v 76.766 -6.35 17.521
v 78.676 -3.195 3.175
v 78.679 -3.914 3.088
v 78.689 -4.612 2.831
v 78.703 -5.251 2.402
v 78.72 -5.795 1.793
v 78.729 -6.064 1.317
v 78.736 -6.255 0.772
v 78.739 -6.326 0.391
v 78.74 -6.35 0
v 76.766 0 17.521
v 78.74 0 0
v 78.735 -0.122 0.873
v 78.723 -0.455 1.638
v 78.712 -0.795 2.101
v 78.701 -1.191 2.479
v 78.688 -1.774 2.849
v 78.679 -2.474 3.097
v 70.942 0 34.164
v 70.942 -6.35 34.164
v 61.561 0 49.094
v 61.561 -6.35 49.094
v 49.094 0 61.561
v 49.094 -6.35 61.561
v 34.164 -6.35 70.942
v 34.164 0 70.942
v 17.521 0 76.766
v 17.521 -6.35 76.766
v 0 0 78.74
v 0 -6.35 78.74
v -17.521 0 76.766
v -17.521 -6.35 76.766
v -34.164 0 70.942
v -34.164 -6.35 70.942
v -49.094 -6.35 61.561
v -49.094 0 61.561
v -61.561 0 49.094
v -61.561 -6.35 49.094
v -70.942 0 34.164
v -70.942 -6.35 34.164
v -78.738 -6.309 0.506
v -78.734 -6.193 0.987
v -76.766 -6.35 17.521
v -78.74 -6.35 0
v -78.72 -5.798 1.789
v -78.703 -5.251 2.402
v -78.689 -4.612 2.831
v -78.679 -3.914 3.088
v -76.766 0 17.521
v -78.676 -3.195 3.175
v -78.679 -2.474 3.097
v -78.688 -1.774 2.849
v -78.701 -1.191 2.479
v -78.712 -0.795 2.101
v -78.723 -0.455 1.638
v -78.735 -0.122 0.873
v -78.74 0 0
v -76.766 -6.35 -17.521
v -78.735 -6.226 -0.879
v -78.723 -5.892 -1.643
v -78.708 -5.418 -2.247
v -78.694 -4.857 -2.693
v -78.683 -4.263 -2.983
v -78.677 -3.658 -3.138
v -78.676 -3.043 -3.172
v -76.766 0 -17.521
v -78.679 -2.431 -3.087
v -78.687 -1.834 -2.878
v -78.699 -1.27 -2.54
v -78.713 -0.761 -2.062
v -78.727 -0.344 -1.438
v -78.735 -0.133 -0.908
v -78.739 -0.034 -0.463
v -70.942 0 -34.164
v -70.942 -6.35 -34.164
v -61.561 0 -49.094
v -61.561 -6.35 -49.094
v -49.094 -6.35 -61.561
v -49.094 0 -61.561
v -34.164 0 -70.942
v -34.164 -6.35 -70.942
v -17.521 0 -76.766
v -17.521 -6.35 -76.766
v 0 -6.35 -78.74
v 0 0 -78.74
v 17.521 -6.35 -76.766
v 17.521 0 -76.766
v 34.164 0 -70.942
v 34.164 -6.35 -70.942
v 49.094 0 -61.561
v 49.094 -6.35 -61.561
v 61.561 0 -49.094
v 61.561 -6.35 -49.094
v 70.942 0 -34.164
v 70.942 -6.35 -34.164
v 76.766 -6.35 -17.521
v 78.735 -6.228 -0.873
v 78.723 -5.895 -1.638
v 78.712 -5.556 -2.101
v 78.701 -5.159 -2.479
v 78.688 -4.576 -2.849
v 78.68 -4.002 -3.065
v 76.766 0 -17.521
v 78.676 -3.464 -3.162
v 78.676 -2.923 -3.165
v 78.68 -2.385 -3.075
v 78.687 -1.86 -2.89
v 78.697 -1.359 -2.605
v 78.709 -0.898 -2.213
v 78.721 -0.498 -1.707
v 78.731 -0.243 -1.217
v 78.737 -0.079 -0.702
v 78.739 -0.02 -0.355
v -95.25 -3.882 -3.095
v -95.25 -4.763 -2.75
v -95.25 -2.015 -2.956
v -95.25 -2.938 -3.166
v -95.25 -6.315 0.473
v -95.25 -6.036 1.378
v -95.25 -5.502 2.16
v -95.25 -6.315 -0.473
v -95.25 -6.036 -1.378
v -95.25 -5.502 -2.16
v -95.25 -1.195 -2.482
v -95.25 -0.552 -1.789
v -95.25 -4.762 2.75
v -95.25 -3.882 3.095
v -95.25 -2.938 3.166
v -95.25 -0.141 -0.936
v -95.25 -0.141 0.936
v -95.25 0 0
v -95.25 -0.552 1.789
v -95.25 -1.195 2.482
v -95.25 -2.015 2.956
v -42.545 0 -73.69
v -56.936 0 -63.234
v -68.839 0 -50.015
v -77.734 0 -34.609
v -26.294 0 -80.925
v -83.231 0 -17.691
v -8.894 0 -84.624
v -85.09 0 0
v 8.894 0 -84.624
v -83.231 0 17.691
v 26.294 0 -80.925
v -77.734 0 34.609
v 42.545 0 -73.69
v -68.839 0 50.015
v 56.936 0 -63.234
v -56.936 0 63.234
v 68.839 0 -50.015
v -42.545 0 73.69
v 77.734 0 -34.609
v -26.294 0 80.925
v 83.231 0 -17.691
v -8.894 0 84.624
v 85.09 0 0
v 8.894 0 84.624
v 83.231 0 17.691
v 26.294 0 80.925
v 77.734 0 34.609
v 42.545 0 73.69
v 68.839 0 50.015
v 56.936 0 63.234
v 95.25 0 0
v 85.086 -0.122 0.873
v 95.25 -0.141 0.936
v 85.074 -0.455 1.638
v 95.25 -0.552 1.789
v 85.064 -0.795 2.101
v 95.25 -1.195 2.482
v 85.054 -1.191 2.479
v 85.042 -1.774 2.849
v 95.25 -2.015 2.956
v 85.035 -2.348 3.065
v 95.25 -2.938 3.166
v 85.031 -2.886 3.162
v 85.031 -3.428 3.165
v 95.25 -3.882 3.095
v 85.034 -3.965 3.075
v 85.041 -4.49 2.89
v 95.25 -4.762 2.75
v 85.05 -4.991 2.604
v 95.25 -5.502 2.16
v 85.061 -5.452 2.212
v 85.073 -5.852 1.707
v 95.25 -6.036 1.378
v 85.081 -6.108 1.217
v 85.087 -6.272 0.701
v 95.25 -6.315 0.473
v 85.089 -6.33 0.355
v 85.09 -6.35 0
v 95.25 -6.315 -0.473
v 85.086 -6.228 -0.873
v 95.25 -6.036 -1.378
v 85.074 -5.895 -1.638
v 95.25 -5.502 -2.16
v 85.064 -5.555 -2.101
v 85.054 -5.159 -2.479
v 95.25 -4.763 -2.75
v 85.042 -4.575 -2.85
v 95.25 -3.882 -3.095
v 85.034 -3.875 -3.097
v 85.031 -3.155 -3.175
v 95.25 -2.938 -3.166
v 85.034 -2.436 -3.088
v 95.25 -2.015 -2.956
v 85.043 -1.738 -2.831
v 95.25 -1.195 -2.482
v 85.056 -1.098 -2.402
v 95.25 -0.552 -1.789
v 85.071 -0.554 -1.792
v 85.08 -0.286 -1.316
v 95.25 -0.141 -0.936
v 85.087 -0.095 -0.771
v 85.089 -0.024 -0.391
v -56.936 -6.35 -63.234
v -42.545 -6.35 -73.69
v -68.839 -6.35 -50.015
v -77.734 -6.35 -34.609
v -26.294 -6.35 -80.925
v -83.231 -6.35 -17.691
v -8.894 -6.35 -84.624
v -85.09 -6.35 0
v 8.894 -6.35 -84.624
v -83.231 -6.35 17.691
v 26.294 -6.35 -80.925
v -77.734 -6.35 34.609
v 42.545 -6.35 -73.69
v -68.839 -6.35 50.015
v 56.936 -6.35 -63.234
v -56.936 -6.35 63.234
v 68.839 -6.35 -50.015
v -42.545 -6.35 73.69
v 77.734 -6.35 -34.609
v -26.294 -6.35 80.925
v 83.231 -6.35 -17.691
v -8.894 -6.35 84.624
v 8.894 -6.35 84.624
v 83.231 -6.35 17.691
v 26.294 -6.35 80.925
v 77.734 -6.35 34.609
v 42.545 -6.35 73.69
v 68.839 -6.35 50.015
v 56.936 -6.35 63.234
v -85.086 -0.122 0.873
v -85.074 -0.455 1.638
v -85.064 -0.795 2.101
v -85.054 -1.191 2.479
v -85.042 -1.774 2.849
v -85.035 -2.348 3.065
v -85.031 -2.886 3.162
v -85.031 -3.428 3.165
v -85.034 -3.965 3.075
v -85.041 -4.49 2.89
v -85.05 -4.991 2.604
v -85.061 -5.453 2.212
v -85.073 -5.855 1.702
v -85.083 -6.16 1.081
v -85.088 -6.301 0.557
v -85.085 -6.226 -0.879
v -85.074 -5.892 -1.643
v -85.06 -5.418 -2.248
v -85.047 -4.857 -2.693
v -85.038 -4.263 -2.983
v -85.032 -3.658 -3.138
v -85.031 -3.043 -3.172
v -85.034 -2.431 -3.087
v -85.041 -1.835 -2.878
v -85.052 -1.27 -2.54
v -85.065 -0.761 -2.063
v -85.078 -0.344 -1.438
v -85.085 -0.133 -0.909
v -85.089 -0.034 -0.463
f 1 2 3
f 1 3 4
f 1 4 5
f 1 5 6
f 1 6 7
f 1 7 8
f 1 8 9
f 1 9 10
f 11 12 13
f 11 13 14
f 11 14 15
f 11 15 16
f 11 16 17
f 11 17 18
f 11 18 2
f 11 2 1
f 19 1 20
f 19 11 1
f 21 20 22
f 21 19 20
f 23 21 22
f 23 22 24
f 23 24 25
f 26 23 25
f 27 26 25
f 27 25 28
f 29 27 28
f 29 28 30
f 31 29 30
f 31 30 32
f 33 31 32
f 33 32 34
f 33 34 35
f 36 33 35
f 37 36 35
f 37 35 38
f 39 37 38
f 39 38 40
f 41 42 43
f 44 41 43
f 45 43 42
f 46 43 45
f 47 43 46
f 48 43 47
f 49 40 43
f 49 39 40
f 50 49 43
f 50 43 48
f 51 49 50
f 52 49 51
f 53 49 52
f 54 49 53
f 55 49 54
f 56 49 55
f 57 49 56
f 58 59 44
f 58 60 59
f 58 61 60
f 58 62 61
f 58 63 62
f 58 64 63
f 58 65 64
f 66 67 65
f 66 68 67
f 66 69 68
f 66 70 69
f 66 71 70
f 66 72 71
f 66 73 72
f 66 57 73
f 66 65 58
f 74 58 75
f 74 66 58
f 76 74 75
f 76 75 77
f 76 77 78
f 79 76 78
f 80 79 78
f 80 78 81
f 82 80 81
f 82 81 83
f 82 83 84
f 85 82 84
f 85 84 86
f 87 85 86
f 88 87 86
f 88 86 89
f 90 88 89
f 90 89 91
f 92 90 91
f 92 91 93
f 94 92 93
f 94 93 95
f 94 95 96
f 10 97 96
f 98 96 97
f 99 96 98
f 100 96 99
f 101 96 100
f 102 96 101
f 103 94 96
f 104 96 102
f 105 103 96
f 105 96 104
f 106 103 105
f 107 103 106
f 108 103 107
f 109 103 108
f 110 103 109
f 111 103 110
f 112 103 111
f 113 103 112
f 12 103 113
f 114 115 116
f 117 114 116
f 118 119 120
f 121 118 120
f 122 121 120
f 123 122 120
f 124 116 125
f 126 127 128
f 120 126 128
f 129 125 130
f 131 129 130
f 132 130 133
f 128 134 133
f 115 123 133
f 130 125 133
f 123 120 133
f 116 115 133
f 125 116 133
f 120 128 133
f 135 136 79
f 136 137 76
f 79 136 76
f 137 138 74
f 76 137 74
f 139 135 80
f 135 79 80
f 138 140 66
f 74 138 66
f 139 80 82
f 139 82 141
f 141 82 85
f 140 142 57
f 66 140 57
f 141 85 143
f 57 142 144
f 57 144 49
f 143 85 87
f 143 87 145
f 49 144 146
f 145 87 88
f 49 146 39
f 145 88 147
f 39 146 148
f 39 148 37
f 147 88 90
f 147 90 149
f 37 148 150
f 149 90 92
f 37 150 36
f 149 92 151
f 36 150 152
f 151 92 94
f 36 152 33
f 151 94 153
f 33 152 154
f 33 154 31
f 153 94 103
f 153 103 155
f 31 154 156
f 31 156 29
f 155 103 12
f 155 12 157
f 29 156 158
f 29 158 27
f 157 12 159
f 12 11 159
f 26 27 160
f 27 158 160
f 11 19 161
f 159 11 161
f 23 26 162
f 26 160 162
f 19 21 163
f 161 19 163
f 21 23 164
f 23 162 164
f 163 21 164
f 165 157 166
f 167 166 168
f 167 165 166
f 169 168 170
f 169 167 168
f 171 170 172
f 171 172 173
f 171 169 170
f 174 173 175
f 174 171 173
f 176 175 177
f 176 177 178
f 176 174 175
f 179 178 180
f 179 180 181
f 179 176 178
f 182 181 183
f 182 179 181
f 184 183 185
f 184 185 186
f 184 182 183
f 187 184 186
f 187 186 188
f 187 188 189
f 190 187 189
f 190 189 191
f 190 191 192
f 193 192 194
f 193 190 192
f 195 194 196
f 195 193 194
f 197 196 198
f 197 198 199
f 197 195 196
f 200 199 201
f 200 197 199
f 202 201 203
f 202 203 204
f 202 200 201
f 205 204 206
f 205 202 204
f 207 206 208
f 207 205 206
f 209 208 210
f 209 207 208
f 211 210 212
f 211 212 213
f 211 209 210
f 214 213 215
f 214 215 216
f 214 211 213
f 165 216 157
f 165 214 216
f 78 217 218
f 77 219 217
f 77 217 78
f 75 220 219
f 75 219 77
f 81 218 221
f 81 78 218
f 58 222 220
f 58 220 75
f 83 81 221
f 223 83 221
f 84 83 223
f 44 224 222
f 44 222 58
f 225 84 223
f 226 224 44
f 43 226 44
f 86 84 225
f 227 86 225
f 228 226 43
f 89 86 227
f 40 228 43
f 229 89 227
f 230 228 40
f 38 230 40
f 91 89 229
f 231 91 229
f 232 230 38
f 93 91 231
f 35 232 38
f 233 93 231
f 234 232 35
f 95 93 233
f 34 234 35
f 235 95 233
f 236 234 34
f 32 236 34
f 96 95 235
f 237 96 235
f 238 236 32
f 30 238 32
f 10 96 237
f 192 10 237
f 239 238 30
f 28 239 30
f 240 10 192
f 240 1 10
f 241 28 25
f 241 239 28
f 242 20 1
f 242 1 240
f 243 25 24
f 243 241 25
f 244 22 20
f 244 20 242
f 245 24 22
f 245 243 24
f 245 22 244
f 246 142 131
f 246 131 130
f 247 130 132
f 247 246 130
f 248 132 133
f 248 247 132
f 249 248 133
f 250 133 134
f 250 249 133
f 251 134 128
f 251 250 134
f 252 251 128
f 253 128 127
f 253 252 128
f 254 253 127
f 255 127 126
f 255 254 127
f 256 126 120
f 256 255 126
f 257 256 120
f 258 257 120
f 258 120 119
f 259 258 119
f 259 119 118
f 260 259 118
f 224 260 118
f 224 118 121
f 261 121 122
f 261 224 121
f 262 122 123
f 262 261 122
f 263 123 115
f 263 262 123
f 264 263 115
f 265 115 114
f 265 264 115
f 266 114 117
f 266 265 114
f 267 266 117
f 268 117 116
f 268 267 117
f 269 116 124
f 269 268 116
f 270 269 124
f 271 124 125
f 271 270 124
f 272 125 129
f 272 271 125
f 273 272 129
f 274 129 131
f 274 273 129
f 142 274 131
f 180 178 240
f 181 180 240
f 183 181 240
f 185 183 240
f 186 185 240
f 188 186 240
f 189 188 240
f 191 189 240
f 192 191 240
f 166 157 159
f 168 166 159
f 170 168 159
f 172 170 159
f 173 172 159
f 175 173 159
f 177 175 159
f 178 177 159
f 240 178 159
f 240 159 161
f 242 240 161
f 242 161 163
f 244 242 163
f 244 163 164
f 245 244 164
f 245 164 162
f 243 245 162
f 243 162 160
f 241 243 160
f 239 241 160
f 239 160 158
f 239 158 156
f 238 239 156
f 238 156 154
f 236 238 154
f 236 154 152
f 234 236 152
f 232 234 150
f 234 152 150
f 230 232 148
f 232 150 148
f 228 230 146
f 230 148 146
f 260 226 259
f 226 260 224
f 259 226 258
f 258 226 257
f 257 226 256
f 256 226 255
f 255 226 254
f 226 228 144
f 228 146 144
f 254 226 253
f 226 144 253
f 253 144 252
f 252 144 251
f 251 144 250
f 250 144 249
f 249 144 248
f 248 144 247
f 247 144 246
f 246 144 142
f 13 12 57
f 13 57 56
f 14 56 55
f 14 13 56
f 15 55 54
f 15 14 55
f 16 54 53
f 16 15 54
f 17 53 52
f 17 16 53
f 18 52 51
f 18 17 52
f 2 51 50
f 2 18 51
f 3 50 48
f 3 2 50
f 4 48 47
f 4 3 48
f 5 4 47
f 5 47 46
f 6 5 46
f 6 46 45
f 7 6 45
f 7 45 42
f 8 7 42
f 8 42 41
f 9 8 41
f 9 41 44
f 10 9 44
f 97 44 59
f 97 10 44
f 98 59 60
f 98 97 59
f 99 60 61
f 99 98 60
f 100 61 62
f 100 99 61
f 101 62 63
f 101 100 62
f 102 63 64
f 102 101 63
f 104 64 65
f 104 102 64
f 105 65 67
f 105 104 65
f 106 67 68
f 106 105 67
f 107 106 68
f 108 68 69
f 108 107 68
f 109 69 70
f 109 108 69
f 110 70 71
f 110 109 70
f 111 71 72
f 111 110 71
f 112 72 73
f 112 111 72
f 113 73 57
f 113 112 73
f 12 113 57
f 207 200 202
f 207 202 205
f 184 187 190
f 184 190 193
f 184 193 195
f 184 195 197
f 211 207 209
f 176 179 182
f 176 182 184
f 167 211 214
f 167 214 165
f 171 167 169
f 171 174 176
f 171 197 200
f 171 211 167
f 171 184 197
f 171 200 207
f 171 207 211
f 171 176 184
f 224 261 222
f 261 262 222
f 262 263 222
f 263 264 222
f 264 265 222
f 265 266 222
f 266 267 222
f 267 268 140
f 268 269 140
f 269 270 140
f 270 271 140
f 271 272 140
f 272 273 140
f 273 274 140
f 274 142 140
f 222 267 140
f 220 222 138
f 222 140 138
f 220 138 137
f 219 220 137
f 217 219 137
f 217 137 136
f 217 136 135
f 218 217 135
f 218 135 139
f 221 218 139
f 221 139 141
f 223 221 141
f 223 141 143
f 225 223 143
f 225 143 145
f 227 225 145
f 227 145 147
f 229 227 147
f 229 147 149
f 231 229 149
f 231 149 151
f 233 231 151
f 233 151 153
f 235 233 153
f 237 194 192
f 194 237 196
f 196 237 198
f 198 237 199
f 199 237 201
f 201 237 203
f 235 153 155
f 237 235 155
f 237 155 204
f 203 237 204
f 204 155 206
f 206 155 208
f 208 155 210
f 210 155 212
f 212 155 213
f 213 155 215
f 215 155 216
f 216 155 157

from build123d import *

# Parameters (mm, degrees)
F0_R     = 85.09
F0_R_2   = 78.74
F1_DEPTH = 6.35
F2_R     = 3.175
F3_DEPTH = 95.25


with BuildPart() as f1:
    # F0 (on Front) → F1 (new body)
    with BuildSketch(Plane.XZ):
        Circle(F0_R)
        Circle(F0_R_2, mode=Mode.SUBTRACT)
    extrude(amount=F1_DEPTH)

    # F2 (on Right) → F3 (join, symmetric)
    with BuildSketch(Plane.YZ):
        with Locations((-3.175, 0)):
            Circle(F2_R)
    extrude(amount=F3_DEPTH, both=True)


solid = f1.part
